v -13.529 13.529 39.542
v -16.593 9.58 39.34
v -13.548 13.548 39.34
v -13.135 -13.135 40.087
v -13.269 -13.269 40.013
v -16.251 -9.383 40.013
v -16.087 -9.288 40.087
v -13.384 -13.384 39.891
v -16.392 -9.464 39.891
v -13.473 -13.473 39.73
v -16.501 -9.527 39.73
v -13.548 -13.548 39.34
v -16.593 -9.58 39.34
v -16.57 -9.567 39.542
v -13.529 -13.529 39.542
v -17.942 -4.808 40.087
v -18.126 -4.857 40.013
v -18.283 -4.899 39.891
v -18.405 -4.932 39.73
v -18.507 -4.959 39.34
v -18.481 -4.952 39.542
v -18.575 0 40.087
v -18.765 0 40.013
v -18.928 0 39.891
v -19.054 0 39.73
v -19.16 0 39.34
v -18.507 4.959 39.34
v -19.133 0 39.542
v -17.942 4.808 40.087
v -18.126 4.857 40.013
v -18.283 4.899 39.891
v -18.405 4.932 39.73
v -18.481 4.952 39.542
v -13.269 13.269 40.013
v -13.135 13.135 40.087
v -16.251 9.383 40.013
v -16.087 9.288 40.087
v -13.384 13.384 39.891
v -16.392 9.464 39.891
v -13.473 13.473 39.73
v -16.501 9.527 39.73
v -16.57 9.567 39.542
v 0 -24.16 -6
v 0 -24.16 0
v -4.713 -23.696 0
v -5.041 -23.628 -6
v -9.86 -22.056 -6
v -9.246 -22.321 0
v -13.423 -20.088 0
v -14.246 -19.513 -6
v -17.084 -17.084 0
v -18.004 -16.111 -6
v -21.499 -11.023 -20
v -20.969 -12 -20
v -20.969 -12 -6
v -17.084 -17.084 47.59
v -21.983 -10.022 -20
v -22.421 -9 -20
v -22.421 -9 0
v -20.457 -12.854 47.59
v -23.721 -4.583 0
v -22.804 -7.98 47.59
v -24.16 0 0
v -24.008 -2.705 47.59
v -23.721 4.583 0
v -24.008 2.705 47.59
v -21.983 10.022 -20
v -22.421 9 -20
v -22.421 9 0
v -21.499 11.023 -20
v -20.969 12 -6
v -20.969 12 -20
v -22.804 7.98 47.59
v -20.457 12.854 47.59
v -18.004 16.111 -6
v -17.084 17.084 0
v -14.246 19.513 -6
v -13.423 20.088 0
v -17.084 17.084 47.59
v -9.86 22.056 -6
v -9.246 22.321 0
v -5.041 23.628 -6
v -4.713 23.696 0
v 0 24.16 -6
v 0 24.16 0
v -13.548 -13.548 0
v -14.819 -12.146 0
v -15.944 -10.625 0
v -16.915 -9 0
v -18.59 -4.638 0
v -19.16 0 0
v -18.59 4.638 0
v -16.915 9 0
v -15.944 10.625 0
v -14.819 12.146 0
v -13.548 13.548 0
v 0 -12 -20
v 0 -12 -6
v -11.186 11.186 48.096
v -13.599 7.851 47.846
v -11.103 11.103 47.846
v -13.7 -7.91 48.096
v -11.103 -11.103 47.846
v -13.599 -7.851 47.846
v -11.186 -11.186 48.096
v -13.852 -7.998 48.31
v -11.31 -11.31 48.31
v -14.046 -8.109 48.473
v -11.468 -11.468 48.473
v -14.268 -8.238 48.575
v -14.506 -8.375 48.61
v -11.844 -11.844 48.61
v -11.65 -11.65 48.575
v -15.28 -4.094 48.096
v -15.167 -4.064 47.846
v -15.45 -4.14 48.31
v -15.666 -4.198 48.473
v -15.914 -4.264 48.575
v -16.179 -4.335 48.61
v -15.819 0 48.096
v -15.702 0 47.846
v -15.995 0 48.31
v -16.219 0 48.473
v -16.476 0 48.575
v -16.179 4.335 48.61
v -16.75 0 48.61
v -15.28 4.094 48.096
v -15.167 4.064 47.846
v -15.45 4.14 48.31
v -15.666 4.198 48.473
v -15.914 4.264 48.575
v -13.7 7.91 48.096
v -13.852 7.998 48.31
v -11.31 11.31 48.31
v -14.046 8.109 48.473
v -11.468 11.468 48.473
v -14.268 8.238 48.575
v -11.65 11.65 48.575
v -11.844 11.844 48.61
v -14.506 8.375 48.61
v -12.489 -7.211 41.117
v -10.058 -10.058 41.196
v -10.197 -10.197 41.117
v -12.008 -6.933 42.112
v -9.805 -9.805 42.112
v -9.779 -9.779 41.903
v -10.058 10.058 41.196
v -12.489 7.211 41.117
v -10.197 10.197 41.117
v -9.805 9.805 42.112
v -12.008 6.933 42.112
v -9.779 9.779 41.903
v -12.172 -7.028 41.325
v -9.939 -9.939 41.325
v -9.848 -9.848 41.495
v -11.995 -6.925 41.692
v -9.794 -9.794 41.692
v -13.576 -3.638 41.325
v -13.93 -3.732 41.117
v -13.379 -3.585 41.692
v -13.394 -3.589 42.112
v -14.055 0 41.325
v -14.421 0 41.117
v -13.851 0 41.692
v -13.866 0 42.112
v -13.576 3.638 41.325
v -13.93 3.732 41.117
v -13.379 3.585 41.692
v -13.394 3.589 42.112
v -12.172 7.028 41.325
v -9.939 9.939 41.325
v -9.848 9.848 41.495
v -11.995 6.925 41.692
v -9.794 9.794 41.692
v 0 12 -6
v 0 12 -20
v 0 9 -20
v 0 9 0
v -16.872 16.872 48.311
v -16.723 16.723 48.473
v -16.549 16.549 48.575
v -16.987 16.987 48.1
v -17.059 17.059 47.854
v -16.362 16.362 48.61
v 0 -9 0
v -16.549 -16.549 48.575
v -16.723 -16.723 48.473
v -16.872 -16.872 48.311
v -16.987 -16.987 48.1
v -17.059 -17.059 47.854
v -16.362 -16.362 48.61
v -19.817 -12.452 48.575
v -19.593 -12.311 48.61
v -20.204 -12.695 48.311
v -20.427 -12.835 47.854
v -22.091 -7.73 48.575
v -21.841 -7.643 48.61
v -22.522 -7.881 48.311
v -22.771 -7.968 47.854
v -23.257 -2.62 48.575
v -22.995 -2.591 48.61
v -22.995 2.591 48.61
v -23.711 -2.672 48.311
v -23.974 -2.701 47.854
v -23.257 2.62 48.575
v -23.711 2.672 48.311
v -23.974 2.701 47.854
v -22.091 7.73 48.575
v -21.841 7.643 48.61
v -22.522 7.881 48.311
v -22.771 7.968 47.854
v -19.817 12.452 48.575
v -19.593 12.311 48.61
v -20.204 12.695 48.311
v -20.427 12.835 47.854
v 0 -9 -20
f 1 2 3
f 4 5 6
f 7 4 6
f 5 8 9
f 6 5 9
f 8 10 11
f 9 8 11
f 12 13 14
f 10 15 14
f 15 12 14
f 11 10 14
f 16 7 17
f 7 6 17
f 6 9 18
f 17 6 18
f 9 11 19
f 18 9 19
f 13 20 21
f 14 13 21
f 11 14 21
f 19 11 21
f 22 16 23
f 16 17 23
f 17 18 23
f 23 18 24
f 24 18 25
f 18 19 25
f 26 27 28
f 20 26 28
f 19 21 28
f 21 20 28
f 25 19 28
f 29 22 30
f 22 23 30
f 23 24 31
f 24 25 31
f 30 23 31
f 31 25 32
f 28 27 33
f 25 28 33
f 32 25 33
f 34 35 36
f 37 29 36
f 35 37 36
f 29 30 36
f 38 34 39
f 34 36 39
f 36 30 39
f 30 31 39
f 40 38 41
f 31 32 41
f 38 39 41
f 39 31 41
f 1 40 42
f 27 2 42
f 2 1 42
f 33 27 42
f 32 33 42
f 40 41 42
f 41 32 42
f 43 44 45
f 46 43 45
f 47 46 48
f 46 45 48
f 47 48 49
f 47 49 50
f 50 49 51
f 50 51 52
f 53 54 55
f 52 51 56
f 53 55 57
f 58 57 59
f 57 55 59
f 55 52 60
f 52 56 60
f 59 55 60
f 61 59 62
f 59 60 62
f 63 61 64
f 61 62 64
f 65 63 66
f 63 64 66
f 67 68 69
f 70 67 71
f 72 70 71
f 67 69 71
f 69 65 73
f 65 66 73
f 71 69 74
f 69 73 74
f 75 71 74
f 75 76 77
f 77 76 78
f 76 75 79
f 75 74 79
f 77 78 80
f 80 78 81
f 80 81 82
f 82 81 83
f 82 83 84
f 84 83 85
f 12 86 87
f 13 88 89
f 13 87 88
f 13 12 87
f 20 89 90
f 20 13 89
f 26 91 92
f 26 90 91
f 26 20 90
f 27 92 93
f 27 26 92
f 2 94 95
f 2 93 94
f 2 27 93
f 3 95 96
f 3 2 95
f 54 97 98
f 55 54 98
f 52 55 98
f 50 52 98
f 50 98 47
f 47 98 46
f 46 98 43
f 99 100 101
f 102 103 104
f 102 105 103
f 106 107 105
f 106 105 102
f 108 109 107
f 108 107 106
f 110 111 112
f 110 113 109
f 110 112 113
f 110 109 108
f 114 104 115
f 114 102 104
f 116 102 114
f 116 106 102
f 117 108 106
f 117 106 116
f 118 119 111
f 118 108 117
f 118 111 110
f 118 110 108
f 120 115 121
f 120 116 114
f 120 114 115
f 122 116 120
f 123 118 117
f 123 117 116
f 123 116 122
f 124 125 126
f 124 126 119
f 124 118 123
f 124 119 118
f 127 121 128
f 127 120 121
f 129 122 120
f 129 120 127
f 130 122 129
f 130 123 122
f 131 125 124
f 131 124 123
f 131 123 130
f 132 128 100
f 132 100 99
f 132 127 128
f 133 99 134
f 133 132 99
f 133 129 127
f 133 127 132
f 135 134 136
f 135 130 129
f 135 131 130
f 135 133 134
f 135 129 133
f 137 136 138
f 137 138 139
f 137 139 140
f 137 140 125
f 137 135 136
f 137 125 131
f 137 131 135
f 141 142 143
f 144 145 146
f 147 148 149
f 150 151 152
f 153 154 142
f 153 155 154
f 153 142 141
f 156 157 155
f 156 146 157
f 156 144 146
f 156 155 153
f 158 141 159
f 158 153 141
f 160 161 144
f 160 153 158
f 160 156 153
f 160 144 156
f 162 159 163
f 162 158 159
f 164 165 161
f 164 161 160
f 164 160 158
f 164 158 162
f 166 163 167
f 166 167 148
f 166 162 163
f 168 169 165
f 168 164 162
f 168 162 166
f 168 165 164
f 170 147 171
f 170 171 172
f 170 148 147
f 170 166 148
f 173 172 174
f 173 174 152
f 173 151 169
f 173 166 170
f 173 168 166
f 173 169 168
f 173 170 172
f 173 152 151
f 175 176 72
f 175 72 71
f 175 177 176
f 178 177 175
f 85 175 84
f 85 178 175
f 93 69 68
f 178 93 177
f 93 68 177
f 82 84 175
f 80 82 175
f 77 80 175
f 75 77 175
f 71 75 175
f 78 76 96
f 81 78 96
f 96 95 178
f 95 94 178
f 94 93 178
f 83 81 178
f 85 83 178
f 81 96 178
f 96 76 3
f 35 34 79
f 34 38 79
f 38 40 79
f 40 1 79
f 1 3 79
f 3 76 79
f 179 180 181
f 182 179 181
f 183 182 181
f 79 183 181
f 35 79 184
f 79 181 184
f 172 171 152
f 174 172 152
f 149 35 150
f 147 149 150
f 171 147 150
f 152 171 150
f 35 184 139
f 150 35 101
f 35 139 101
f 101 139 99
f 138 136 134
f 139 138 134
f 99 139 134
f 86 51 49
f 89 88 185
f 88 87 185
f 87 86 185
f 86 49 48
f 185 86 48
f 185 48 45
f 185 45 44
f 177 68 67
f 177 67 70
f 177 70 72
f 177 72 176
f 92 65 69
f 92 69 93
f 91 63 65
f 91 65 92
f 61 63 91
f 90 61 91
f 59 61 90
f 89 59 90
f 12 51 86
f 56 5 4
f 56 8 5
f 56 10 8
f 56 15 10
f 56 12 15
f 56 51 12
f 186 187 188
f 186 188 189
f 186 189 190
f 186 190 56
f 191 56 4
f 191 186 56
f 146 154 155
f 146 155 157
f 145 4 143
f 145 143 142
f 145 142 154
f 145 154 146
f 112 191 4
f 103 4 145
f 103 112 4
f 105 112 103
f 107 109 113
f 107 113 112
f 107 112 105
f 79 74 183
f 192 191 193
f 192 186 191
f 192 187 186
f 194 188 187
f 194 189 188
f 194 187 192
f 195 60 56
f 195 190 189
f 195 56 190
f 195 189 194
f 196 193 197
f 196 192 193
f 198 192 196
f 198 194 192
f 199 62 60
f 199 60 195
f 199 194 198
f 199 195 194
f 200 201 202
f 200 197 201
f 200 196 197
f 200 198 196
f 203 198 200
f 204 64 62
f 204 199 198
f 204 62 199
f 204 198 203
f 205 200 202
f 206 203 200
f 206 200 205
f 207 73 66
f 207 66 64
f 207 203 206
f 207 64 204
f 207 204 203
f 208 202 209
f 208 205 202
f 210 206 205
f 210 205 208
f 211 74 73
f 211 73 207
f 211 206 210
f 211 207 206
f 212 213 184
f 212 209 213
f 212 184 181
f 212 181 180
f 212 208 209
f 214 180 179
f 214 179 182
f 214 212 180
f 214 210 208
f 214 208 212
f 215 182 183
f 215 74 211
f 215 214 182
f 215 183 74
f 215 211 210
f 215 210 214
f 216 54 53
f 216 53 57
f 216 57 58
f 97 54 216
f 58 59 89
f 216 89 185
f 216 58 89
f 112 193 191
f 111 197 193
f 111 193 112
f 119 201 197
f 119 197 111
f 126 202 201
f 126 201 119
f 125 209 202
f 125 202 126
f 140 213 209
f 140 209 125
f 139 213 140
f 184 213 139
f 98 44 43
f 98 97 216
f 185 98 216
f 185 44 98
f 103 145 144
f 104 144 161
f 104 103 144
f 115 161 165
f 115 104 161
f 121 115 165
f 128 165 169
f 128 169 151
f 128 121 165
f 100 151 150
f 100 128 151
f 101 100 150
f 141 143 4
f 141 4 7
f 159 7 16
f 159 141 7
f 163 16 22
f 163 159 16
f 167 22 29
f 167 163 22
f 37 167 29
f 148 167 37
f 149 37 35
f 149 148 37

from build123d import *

# Parameters (mm, degrees)
REVOLUTION001_ANGLE = 90
PAD_DEPTH           = 20
SKETCH003_W         = 14
SKETCH003_H         = 12.160038
POCKET_DEPTH        = 24.1610380001
SKETCH004_R         = 2
POCKET001_DEPTH     = 54.611
SKETCH007_W         = 25
SKETCH007_H         = 18
POCKET002_DEPTH     = 20


with BuildPart() as part:
    # Sketch001 → Revolution001 (revolve, symmetric)
    with BuildSketch(Plane.XZ) as revolution001_sk:
        with BuildLine():
            Line((-13.8660806584, 42.1124829734), (-15.7024671828, 47.8455523549))
            ThreePointArc((-15.7024671828, 47.8455523549), (-16.1016197671, 48.3985683965), (-16.750038, 48.61))
            Line((-16.750038, 48.61), (-23.140038, 48.61))
            ThreePointArc((-23.140038, 48.61), (-23.8612869168, 48.3112489168), (-24.160038, 47.59))
            Line((-24.160038, 47.59), (-24.160038, 0))
            Line((-24.160038, 0), (-19.160038, 0))
            Line((-19.160038, 0), (-19.160038, 39.34))
            ThreePointArc((-18.5753612917, 40.0873655582), (-18.9965027288, 39.8144476079), (-19.160038, 39.34))
            Line((-18.5753612917, 40.0873655582), (-14.4211735138, 41.1174742446))
            ThreePointArc((-14.4211735138, 41.1174742446), (-13.9277334111, 41.4945364128), (-13.8660806584, 42.1124829734))
        make_face()
    revolve(axis=Axis((0, 0, 0), (0, 0, 1)), revolution_arc=REVOLUTION001_ANGLE / 2)
    revolve(revolution001_sk.sketch, axis=Axis((0, 0, 0), (0, 0, -1)), revolution_arc=REVOLUTION001_ANGLE / 2)

    # Sketch002 (on Face8 of Revolution001) → Pad (new body)
    with BuildSketch(Plane(origin=(0, 0, 0), x_dir=(1, 0, 0), z_dir=(0, 0, -1))):
        with BuildLine():
            ThreePointArc((0, 24.160038), (-24.160038, 0), (0, -24.160038))
            Line((0, -9), (0, -24.160038))
            ThreePointArc((0, 9), (-9, 0), (0, -9))
            Line((0, 24.160038), (0, 9))
        make_face()
    extrude(amount=PAD_DEPTH)

    # Sketch003 (on Face13 of Pad) → Pocket (cut, through all)
    with BuildSketch(Plane(origin=(0, 0, 0), x_dir=(0, 0, 1), z_dir=(1, 0, 0))):
        with Locations((-13, 18.080019)):
            Rectangle(SKETCH003_W, SKETCH003_H)
        with Locations((-13, -18.080019)):
            Rectangle(SKETCH003_W, SKETCH003_H)
    extrude(amount=-POCKET_DEPTH, mode=Mode.SUBTRACT)

    # Sketch004 (on Face20 of Pocket) → Pocket001 (cut, through all)
    with BuildSketch(Plane(origin=(0, 0, -6), x_dir=(1, 0, 0), z_dir=(0, 0, -1))):
        with Locations((-10, -5)):
            Circle(SKETCH004_R)
    extrude(amount=-POCKET001_DEPTH, mode=Mode.SUBTRACT)

    # Sketch007 (on Face18 of Pocket001) → Pocket002 (cut)
    with BuildSketch(Plane(origin=(0, 0, -20), x_dir=(1, 0, 0), z_dir=(0, 0, -1))):
        with Locations((-12.5, 0)):
            Rectangle(SKETCH007_W, SKETCH007_H)
    extrude(amount=-POCKET002_DEPTH, mode=Mode.SUBTRACT)


solid = part.part
